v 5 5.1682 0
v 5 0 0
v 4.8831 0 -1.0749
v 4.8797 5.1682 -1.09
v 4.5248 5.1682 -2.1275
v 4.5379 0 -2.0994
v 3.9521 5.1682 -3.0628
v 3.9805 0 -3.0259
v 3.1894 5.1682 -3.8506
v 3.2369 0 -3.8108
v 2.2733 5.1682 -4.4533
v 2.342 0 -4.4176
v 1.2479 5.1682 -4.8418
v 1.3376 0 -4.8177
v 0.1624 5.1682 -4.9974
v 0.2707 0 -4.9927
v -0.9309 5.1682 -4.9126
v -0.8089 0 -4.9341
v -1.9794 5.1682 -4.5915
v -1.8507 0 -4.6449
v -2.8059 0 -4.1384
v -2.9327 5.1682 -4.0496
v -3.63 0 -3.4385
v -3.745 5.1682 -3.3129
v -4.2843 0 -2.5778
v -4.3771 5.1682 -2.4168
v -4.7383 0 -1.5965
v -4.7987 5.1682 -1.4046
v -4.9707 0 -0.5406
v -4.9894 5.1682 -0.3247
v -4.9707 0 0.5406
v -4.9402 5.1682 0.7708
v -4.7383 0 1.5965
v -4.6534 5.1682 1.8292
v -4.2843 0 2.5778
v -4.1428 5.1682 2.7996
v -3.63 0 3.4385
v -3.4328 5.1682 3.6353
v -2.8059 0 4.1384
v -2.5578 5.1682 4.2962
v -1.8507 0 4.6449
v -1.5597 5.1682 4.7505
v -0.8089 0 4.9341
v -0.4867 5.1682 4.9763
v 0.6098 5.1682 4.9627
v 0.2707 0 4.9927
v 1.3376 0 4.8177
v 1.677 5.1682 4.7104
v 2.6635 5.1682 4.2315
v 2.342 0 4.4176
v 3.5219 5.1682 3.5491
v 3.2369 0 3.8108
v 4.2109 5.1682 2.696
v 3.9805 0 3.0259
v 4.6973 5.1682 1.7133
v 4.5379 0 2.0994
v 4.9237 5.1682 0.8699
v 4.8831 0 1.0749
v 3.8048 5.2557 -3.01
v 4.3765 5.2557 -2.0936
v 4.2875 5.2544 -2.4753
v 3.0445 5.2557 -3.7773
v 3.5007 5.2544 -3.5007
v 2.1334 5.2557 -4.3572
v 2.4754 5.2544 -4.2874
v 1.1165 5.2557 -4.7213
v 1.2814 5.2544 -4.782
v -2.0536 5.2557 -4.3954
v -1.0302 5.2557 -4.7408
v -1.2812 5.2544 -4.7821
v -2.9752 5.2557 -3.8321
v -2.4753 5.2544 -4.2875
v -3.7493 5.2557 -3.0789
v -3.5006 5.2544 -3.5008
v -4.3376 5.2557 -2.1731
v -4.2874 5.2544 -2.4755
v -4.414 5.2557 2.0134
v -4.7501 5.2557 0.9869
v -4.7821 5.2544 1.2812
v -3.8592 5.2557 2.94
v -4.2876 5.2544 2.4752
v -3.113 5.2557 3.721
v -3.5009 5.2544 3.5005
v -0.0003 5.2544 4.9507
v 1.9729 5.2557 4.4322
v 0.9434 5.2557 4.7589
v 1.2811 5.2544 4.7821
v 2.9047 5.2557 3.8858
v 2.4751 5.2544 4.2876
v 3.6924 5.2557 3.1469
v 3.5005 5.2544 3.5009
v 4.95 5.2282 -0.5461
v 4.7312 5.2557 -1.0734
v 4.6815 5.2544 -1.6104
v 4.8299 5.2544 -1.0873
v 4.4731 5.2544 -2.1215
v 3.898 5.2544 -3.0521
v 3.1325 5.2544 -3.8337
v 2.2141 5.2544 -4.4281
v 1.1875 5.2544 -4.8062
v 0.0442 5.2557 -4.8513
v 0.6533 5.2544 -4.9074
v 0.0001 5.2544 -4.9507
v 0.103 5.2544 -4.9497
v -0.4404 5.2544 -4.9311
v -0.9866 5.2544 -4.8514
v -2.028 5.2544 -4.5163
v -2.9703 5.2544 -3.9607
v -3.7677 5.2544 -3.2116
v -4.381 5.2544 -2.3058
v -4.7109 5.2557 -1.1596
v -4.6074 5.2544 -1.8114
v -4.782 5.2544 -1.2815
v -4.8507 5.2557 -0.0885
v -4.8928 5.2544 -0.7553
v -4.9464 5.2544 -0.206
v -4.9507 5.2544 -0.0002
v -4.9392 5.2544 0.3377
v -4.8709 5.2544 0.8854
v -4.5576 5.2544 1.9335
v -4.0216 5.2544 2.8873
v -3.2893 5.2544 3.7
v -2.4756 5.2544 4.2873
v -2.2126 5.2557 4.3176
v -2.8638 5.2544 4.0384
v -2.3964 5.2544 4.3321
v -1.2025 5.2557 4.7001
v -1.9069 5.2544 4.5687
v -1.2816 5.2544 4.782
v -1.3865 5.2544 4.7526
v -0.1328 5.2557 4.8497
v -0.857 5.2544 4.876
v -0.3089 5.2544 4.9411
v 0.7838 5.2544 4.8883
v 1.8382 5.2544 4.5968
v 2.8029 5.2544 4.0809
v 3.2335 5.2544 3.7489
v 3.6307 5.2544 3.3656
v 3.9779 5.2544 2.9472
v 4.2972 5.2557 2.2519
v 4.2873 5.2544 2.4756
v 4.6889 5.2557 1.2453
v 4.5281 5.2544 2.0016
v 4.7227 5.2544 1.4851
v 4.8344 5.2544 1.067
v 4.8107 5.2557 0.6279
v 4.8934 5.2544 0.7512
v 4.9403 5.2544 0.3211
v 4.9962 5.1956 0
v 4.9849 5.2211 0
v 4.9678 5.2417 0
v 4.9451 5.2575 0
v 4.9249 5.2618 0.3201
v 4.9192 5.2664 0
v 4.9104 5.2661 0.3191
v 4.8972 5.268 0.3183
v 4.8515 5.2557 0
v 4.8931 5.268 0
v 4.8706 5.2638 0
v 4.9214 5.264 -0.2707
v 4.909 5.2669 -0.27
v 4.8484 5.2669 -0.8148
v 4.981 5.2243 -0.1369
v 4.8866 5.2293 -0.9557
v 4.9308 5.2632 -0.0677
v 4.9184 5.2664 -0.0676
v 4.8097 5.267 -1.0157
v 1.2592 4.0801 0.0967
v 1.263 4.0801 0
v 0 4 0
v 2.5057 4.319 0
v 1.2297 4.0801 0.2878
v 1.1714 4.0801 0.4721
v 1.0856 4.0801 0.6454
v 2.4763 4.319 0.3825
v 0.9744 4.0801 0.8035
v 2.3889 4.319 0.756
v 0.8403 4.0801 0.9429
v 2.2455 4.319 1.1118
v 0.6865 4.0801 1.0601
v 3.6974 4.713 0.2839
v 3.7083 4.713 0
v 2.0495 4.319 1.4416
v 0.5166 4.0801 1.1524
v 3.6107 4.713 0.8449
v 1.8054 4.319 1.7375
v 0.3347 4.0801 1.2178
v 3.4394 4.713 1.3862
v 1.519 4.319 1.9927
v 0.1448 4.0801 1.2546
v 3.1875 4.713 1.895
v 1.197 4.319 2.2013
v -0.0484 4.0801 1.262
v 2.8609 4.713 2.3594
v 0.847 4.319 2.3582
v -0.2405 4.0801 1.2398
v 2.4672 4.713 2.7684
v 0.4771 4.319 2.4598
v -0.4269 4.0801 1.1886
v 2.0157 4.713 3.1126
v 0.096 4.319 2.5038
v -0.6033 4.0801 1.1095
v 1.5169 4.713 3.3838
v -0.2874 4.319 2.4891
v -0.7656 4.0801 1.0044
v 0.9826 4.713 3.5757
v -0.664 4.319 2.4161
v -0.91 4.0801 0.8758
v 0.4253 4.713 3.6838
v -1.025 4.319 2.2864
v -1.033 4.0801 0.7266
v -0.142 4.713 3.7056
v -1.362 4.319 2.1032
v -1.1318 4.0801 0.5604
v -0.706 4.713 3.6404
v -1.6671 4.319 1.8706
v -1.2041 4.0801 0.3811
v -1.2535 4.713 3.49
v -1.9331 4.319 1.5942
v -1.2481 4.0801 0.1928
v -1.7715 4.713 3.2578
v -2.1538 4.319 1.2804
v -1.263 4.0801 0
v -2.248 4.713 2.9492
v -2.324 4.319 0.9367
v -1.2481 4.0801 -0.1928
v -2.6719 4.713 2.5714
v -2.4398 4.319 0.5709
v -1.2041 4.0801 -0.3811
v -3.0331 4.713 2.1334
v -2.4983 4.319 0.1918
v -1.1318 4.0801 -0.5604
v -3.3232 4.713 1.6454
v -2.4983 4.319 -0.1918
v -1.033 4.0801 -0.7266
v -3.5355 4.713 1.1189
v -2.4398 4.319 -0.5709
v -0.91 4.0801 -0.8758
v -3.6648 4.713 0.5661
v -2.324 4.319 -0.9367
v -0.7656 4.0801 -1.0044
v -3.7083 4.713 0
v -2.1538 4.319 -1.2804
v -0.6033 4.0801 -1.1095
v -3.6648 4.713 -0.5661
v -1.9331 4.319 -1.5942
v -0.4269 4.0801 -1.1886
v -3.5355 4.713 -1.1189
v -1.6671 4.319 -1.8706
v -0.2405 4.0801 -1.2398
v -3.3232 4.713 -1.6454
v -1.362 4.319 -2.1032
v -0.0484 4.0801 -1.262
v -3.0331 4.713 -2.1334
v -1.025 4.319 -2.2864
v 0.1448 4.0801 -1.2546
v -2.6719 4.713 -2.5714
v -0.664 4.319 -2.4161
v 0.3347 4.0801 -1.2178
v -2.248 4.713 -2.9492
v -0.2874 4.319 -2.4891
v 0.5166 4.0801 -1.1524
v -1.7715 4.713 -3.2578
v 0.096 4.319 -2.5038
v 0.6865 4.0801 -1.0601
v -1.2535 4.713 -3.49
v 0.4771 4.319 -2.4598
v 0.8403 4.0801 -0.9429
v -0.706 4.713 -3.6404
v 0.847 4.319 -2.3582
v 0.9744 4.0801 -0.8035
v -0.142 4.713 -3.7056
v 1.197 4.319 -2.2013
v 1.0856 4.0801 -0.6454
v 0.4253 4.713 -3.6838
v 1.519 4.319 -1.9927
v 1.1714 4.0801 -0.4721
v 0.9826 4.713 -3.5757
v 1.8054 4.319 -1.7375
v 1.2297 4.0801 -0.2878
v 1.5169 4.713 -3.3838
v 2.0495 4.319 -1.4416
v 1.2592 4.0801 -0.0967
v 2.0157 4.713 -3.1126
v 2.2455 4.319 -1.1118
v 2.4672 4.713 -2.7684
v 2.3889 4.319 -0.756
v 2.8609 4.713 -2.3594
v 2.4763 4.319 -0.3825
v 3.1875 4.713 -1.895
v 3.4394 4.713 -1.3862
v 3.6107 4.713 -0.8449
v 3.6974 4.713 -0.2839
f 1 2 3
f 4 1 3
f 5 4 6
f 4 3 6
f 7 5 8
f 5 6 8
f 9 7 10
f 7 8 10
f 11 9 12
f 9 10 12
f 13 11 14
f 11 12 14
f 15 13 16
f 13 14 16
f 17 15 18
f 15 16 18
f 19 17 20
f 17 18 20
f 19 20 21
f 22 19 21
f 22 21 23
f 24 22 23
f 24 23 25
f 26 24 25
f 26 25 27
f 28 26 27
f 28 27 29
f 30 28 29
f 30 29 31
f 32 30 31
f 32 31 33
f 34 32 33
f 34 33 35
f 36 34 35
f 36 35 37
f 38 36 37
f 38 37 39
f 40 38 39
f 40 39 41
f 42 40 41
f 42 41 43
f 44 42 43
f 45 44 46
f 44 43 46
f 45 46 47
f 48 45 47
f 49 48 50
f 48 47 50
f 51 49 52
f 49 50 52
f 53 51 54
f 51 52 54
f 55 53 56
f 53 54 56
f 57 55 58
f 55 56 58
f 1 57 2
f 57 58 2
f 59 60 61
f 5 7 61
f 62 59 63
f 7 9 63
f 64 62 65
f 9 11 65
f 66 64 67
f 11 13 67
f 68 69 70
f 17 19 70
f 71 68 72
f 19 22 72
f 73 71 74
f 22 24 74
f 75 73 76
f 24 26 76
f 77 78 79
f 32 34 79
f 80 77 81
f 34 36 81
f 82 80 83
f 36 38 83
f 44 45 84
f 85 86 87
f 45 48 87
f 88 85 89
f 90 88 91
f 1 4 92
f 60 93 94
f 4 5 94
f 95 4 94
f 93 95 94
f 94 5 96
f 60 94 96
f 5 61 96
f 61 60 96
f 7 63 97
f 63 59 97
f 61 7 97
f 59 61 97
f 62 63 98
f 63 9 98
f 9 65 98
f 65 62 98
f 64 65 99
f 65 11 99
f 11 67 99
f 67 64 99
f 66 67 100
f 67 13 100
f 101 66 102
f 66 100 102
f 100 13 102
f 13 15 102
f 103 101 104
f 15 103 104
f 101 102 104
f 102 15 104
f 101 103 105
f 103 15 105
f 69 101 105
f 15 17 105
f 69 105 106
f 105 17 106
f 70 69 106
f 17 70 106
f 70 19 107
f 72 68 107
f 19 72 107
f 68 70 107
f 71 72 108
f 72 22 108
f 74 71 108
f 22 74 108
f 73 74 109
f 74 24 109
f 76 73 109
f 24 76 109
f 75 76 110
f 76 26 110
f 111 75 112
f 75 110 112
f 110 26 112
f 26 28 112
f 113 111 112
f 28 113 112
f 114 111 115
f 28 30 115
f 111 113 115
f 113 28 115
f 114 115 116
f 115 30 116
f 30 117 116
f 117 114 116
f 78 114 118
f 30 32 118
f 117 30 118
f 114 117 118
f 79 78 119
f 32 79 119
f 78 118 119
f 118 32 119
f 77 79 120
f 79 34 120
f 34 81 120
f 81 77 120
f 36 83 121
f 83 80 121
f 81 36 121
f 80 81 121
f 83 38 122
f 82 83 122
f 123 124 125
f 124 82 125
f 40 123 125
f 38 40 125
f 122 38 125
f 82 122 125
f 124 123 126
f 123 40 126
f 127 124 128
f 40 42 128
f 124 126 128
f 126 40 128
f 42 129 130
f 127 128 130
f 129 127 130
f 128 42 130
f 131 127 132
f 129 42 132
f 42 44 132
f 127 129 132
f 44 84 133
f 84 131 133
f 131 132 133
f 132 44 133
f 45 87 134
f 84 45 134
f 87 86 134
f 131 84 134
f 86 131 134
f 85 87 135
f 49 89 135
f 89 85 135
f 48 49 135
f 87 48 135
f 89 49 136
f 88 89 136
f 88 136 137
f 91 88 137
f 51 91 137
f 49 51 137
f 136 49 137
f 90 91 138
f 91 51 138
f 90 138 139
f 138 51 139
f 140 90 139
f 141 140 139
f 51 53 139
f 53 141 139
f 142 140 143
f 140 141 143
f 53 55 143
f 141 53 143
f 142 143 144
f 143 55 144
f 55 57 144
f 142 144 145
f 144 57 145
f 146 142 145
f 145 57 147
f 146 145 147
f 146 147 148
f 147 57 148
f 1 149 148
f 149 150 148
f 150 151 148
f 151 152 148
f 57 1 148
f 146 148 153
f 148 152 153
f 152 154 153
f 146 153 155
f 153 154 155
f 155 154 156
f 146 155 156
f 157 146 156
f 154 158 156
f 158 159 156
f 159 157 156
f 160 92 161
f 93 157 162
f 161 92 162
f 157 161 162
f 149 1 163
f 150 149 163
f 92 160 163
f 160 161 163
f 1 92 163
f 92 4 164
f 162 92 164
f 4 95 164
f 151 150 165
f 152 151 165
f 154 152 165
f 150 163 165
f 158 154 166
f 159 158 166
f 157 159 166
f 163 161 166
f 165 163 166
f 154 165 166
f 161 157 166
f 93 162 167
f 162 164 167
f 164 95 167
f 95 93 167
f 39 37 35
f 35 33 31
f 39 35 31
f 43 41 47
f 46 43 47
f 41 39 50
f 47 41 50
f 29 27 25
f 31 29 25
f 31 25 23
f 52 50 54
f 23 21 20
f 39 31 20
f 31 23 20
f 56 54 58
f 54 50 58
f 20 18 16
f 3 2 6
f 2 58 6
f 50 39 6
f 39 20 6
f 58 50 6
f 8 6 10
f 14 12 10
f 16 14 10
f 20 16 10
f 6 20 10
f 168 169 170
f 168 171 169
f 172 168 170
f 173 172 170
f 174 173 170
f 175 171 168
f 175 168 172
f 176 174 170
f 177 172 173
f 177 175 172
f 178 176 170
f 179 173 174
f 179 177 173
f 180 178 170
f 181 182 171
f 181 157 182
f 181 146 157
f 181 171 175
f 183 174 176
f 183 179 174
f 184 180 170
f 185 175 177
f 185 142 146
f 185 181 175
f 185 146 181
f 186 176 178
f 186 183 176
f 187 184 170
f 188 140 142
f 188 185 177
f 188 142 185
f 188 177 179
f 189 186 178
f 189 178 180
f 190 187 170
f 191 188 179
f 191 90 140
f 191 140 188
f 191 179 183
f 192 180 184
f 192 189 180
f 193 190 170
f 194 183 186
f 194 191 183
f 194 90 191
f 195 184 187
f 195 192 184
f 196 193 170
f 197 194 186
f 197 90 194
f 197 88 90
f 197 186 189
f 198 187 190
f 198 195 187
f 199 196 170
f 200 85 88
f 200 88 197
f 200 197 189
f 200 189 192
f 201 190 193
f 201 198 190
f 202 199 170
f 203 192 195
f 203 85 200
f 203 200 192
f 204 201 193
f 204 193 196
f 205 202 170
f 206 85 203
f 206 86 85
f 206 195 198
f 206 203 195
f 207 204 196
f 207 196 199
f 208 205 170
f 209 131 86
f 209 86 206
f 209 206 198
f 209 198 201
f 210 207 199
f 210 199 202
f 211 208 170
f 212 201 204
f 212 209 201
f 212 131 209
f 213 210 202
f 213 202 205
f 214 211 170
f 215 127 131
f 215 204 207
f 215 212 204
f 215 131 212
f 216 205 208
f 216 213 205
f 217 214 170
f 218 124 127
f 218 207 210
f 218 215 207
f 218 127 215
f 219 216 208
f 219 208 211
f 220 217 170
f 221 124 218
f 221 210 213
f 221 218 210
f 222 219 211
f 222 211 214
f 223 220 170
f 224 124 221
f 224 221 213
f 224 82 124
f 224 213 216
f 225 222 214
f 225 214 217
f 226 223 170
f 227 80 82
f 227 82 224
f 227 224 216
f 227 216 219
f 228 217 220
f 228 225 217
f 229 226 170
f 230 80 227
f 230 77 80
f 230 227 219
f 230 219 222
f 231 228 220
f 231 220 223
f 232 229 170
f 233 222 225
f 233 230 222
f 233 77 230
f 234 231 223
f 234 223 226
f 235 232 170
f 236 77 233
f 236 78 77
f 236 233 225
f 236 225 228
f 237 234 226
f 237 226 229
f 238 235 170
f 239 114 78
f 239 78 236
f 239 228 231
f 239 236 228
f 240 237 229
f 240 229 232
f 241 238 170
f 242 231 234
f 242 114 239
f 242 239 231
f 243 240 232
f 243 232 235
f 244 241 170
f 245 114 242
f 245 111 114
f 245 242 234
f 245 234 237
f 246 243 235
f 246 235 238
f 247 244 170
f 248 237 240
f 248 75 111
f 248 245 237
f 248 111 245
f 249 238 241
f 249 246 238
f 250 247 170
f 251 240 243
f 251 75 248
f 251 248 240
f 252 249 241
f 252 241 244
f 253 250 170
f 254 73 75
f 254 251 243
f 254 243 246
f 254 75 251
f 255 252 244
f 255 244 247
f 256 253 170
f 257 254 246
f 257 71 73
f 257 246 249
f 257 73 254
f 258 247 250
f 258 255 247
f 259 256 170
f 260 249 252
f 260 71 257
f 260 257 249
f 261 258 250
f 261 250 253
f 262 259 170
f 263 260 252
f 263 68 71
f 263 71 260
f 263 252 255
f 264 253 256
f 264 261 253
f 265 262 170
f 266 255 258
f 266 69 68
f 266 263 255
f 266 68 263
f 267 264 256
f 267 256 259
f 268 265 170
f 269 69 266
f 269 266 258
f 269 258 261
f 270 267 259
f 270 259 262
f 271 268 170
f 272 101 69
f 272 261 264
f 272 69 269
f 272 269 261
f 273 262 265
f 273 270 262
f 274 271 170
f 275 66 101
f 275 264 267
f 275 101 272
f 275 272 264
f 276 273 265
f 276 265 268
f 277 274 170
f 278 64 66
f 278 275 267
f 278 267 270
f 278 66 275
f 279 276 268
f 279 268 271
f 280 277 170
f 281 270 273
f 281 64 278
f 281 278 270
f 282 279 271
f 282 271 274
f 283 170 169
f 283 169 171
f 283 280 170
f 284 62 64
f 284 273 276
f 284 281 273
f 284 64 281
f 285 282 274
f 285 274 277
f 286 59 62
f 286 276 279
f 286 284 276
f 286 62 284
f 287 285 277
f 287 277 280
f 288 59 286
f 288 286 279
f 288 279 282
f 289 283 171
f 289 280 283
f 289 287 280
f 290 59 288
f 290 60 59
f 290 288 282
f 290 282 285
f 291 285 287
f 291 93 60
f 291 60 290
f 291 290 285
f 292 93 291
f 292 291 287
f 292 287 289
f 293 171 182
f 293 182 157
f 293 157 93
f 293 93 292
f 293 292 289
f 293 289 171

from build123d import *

# Parameters (mm, degrees)
SKETCH2_R           = 5
BOSS_EXTRUDE1_DEPTH = 8
FILLET1_R           = 0.1


with BuildPart() as part:
    # Sketch2 → Boss-Extrude1 (new body)
    with BuildSketch(Plane(origin=(0, 0, 0), x_dir=(1, 0, 0), z_dir=(0, 1, 0))):
        Circle(SKETCH2_R)
    extrude(amount=BOSS_EXTRUDE1_DEPTH)

    # Sketch3 one side → Cut-Revolve1 (revolve, cut)
    with BuildSketch(Plane.XY):
        with BuildLine():
            ThreePointArc((0, 4), (7.071067812, 6.928932188), (10, 14))
            ThreePointArc((10, 14), (7.071067812, 21.071067812), (0, 24))
            Line((0, 24), (0, 4))
        make_face()
    revolve(axis=Axis((0, 24, 0), (0, -1, 0)), mode=Mode.SUBTRACT)

    # Fillet1
    fillet1_edges = [part.edges().sort_by_distance(p)[0] for p in [
        (-5, 5.339745962, 0),
    ]]
    fillet(fillet1_edges, radius=FILLET1_R)


solid = part.part
